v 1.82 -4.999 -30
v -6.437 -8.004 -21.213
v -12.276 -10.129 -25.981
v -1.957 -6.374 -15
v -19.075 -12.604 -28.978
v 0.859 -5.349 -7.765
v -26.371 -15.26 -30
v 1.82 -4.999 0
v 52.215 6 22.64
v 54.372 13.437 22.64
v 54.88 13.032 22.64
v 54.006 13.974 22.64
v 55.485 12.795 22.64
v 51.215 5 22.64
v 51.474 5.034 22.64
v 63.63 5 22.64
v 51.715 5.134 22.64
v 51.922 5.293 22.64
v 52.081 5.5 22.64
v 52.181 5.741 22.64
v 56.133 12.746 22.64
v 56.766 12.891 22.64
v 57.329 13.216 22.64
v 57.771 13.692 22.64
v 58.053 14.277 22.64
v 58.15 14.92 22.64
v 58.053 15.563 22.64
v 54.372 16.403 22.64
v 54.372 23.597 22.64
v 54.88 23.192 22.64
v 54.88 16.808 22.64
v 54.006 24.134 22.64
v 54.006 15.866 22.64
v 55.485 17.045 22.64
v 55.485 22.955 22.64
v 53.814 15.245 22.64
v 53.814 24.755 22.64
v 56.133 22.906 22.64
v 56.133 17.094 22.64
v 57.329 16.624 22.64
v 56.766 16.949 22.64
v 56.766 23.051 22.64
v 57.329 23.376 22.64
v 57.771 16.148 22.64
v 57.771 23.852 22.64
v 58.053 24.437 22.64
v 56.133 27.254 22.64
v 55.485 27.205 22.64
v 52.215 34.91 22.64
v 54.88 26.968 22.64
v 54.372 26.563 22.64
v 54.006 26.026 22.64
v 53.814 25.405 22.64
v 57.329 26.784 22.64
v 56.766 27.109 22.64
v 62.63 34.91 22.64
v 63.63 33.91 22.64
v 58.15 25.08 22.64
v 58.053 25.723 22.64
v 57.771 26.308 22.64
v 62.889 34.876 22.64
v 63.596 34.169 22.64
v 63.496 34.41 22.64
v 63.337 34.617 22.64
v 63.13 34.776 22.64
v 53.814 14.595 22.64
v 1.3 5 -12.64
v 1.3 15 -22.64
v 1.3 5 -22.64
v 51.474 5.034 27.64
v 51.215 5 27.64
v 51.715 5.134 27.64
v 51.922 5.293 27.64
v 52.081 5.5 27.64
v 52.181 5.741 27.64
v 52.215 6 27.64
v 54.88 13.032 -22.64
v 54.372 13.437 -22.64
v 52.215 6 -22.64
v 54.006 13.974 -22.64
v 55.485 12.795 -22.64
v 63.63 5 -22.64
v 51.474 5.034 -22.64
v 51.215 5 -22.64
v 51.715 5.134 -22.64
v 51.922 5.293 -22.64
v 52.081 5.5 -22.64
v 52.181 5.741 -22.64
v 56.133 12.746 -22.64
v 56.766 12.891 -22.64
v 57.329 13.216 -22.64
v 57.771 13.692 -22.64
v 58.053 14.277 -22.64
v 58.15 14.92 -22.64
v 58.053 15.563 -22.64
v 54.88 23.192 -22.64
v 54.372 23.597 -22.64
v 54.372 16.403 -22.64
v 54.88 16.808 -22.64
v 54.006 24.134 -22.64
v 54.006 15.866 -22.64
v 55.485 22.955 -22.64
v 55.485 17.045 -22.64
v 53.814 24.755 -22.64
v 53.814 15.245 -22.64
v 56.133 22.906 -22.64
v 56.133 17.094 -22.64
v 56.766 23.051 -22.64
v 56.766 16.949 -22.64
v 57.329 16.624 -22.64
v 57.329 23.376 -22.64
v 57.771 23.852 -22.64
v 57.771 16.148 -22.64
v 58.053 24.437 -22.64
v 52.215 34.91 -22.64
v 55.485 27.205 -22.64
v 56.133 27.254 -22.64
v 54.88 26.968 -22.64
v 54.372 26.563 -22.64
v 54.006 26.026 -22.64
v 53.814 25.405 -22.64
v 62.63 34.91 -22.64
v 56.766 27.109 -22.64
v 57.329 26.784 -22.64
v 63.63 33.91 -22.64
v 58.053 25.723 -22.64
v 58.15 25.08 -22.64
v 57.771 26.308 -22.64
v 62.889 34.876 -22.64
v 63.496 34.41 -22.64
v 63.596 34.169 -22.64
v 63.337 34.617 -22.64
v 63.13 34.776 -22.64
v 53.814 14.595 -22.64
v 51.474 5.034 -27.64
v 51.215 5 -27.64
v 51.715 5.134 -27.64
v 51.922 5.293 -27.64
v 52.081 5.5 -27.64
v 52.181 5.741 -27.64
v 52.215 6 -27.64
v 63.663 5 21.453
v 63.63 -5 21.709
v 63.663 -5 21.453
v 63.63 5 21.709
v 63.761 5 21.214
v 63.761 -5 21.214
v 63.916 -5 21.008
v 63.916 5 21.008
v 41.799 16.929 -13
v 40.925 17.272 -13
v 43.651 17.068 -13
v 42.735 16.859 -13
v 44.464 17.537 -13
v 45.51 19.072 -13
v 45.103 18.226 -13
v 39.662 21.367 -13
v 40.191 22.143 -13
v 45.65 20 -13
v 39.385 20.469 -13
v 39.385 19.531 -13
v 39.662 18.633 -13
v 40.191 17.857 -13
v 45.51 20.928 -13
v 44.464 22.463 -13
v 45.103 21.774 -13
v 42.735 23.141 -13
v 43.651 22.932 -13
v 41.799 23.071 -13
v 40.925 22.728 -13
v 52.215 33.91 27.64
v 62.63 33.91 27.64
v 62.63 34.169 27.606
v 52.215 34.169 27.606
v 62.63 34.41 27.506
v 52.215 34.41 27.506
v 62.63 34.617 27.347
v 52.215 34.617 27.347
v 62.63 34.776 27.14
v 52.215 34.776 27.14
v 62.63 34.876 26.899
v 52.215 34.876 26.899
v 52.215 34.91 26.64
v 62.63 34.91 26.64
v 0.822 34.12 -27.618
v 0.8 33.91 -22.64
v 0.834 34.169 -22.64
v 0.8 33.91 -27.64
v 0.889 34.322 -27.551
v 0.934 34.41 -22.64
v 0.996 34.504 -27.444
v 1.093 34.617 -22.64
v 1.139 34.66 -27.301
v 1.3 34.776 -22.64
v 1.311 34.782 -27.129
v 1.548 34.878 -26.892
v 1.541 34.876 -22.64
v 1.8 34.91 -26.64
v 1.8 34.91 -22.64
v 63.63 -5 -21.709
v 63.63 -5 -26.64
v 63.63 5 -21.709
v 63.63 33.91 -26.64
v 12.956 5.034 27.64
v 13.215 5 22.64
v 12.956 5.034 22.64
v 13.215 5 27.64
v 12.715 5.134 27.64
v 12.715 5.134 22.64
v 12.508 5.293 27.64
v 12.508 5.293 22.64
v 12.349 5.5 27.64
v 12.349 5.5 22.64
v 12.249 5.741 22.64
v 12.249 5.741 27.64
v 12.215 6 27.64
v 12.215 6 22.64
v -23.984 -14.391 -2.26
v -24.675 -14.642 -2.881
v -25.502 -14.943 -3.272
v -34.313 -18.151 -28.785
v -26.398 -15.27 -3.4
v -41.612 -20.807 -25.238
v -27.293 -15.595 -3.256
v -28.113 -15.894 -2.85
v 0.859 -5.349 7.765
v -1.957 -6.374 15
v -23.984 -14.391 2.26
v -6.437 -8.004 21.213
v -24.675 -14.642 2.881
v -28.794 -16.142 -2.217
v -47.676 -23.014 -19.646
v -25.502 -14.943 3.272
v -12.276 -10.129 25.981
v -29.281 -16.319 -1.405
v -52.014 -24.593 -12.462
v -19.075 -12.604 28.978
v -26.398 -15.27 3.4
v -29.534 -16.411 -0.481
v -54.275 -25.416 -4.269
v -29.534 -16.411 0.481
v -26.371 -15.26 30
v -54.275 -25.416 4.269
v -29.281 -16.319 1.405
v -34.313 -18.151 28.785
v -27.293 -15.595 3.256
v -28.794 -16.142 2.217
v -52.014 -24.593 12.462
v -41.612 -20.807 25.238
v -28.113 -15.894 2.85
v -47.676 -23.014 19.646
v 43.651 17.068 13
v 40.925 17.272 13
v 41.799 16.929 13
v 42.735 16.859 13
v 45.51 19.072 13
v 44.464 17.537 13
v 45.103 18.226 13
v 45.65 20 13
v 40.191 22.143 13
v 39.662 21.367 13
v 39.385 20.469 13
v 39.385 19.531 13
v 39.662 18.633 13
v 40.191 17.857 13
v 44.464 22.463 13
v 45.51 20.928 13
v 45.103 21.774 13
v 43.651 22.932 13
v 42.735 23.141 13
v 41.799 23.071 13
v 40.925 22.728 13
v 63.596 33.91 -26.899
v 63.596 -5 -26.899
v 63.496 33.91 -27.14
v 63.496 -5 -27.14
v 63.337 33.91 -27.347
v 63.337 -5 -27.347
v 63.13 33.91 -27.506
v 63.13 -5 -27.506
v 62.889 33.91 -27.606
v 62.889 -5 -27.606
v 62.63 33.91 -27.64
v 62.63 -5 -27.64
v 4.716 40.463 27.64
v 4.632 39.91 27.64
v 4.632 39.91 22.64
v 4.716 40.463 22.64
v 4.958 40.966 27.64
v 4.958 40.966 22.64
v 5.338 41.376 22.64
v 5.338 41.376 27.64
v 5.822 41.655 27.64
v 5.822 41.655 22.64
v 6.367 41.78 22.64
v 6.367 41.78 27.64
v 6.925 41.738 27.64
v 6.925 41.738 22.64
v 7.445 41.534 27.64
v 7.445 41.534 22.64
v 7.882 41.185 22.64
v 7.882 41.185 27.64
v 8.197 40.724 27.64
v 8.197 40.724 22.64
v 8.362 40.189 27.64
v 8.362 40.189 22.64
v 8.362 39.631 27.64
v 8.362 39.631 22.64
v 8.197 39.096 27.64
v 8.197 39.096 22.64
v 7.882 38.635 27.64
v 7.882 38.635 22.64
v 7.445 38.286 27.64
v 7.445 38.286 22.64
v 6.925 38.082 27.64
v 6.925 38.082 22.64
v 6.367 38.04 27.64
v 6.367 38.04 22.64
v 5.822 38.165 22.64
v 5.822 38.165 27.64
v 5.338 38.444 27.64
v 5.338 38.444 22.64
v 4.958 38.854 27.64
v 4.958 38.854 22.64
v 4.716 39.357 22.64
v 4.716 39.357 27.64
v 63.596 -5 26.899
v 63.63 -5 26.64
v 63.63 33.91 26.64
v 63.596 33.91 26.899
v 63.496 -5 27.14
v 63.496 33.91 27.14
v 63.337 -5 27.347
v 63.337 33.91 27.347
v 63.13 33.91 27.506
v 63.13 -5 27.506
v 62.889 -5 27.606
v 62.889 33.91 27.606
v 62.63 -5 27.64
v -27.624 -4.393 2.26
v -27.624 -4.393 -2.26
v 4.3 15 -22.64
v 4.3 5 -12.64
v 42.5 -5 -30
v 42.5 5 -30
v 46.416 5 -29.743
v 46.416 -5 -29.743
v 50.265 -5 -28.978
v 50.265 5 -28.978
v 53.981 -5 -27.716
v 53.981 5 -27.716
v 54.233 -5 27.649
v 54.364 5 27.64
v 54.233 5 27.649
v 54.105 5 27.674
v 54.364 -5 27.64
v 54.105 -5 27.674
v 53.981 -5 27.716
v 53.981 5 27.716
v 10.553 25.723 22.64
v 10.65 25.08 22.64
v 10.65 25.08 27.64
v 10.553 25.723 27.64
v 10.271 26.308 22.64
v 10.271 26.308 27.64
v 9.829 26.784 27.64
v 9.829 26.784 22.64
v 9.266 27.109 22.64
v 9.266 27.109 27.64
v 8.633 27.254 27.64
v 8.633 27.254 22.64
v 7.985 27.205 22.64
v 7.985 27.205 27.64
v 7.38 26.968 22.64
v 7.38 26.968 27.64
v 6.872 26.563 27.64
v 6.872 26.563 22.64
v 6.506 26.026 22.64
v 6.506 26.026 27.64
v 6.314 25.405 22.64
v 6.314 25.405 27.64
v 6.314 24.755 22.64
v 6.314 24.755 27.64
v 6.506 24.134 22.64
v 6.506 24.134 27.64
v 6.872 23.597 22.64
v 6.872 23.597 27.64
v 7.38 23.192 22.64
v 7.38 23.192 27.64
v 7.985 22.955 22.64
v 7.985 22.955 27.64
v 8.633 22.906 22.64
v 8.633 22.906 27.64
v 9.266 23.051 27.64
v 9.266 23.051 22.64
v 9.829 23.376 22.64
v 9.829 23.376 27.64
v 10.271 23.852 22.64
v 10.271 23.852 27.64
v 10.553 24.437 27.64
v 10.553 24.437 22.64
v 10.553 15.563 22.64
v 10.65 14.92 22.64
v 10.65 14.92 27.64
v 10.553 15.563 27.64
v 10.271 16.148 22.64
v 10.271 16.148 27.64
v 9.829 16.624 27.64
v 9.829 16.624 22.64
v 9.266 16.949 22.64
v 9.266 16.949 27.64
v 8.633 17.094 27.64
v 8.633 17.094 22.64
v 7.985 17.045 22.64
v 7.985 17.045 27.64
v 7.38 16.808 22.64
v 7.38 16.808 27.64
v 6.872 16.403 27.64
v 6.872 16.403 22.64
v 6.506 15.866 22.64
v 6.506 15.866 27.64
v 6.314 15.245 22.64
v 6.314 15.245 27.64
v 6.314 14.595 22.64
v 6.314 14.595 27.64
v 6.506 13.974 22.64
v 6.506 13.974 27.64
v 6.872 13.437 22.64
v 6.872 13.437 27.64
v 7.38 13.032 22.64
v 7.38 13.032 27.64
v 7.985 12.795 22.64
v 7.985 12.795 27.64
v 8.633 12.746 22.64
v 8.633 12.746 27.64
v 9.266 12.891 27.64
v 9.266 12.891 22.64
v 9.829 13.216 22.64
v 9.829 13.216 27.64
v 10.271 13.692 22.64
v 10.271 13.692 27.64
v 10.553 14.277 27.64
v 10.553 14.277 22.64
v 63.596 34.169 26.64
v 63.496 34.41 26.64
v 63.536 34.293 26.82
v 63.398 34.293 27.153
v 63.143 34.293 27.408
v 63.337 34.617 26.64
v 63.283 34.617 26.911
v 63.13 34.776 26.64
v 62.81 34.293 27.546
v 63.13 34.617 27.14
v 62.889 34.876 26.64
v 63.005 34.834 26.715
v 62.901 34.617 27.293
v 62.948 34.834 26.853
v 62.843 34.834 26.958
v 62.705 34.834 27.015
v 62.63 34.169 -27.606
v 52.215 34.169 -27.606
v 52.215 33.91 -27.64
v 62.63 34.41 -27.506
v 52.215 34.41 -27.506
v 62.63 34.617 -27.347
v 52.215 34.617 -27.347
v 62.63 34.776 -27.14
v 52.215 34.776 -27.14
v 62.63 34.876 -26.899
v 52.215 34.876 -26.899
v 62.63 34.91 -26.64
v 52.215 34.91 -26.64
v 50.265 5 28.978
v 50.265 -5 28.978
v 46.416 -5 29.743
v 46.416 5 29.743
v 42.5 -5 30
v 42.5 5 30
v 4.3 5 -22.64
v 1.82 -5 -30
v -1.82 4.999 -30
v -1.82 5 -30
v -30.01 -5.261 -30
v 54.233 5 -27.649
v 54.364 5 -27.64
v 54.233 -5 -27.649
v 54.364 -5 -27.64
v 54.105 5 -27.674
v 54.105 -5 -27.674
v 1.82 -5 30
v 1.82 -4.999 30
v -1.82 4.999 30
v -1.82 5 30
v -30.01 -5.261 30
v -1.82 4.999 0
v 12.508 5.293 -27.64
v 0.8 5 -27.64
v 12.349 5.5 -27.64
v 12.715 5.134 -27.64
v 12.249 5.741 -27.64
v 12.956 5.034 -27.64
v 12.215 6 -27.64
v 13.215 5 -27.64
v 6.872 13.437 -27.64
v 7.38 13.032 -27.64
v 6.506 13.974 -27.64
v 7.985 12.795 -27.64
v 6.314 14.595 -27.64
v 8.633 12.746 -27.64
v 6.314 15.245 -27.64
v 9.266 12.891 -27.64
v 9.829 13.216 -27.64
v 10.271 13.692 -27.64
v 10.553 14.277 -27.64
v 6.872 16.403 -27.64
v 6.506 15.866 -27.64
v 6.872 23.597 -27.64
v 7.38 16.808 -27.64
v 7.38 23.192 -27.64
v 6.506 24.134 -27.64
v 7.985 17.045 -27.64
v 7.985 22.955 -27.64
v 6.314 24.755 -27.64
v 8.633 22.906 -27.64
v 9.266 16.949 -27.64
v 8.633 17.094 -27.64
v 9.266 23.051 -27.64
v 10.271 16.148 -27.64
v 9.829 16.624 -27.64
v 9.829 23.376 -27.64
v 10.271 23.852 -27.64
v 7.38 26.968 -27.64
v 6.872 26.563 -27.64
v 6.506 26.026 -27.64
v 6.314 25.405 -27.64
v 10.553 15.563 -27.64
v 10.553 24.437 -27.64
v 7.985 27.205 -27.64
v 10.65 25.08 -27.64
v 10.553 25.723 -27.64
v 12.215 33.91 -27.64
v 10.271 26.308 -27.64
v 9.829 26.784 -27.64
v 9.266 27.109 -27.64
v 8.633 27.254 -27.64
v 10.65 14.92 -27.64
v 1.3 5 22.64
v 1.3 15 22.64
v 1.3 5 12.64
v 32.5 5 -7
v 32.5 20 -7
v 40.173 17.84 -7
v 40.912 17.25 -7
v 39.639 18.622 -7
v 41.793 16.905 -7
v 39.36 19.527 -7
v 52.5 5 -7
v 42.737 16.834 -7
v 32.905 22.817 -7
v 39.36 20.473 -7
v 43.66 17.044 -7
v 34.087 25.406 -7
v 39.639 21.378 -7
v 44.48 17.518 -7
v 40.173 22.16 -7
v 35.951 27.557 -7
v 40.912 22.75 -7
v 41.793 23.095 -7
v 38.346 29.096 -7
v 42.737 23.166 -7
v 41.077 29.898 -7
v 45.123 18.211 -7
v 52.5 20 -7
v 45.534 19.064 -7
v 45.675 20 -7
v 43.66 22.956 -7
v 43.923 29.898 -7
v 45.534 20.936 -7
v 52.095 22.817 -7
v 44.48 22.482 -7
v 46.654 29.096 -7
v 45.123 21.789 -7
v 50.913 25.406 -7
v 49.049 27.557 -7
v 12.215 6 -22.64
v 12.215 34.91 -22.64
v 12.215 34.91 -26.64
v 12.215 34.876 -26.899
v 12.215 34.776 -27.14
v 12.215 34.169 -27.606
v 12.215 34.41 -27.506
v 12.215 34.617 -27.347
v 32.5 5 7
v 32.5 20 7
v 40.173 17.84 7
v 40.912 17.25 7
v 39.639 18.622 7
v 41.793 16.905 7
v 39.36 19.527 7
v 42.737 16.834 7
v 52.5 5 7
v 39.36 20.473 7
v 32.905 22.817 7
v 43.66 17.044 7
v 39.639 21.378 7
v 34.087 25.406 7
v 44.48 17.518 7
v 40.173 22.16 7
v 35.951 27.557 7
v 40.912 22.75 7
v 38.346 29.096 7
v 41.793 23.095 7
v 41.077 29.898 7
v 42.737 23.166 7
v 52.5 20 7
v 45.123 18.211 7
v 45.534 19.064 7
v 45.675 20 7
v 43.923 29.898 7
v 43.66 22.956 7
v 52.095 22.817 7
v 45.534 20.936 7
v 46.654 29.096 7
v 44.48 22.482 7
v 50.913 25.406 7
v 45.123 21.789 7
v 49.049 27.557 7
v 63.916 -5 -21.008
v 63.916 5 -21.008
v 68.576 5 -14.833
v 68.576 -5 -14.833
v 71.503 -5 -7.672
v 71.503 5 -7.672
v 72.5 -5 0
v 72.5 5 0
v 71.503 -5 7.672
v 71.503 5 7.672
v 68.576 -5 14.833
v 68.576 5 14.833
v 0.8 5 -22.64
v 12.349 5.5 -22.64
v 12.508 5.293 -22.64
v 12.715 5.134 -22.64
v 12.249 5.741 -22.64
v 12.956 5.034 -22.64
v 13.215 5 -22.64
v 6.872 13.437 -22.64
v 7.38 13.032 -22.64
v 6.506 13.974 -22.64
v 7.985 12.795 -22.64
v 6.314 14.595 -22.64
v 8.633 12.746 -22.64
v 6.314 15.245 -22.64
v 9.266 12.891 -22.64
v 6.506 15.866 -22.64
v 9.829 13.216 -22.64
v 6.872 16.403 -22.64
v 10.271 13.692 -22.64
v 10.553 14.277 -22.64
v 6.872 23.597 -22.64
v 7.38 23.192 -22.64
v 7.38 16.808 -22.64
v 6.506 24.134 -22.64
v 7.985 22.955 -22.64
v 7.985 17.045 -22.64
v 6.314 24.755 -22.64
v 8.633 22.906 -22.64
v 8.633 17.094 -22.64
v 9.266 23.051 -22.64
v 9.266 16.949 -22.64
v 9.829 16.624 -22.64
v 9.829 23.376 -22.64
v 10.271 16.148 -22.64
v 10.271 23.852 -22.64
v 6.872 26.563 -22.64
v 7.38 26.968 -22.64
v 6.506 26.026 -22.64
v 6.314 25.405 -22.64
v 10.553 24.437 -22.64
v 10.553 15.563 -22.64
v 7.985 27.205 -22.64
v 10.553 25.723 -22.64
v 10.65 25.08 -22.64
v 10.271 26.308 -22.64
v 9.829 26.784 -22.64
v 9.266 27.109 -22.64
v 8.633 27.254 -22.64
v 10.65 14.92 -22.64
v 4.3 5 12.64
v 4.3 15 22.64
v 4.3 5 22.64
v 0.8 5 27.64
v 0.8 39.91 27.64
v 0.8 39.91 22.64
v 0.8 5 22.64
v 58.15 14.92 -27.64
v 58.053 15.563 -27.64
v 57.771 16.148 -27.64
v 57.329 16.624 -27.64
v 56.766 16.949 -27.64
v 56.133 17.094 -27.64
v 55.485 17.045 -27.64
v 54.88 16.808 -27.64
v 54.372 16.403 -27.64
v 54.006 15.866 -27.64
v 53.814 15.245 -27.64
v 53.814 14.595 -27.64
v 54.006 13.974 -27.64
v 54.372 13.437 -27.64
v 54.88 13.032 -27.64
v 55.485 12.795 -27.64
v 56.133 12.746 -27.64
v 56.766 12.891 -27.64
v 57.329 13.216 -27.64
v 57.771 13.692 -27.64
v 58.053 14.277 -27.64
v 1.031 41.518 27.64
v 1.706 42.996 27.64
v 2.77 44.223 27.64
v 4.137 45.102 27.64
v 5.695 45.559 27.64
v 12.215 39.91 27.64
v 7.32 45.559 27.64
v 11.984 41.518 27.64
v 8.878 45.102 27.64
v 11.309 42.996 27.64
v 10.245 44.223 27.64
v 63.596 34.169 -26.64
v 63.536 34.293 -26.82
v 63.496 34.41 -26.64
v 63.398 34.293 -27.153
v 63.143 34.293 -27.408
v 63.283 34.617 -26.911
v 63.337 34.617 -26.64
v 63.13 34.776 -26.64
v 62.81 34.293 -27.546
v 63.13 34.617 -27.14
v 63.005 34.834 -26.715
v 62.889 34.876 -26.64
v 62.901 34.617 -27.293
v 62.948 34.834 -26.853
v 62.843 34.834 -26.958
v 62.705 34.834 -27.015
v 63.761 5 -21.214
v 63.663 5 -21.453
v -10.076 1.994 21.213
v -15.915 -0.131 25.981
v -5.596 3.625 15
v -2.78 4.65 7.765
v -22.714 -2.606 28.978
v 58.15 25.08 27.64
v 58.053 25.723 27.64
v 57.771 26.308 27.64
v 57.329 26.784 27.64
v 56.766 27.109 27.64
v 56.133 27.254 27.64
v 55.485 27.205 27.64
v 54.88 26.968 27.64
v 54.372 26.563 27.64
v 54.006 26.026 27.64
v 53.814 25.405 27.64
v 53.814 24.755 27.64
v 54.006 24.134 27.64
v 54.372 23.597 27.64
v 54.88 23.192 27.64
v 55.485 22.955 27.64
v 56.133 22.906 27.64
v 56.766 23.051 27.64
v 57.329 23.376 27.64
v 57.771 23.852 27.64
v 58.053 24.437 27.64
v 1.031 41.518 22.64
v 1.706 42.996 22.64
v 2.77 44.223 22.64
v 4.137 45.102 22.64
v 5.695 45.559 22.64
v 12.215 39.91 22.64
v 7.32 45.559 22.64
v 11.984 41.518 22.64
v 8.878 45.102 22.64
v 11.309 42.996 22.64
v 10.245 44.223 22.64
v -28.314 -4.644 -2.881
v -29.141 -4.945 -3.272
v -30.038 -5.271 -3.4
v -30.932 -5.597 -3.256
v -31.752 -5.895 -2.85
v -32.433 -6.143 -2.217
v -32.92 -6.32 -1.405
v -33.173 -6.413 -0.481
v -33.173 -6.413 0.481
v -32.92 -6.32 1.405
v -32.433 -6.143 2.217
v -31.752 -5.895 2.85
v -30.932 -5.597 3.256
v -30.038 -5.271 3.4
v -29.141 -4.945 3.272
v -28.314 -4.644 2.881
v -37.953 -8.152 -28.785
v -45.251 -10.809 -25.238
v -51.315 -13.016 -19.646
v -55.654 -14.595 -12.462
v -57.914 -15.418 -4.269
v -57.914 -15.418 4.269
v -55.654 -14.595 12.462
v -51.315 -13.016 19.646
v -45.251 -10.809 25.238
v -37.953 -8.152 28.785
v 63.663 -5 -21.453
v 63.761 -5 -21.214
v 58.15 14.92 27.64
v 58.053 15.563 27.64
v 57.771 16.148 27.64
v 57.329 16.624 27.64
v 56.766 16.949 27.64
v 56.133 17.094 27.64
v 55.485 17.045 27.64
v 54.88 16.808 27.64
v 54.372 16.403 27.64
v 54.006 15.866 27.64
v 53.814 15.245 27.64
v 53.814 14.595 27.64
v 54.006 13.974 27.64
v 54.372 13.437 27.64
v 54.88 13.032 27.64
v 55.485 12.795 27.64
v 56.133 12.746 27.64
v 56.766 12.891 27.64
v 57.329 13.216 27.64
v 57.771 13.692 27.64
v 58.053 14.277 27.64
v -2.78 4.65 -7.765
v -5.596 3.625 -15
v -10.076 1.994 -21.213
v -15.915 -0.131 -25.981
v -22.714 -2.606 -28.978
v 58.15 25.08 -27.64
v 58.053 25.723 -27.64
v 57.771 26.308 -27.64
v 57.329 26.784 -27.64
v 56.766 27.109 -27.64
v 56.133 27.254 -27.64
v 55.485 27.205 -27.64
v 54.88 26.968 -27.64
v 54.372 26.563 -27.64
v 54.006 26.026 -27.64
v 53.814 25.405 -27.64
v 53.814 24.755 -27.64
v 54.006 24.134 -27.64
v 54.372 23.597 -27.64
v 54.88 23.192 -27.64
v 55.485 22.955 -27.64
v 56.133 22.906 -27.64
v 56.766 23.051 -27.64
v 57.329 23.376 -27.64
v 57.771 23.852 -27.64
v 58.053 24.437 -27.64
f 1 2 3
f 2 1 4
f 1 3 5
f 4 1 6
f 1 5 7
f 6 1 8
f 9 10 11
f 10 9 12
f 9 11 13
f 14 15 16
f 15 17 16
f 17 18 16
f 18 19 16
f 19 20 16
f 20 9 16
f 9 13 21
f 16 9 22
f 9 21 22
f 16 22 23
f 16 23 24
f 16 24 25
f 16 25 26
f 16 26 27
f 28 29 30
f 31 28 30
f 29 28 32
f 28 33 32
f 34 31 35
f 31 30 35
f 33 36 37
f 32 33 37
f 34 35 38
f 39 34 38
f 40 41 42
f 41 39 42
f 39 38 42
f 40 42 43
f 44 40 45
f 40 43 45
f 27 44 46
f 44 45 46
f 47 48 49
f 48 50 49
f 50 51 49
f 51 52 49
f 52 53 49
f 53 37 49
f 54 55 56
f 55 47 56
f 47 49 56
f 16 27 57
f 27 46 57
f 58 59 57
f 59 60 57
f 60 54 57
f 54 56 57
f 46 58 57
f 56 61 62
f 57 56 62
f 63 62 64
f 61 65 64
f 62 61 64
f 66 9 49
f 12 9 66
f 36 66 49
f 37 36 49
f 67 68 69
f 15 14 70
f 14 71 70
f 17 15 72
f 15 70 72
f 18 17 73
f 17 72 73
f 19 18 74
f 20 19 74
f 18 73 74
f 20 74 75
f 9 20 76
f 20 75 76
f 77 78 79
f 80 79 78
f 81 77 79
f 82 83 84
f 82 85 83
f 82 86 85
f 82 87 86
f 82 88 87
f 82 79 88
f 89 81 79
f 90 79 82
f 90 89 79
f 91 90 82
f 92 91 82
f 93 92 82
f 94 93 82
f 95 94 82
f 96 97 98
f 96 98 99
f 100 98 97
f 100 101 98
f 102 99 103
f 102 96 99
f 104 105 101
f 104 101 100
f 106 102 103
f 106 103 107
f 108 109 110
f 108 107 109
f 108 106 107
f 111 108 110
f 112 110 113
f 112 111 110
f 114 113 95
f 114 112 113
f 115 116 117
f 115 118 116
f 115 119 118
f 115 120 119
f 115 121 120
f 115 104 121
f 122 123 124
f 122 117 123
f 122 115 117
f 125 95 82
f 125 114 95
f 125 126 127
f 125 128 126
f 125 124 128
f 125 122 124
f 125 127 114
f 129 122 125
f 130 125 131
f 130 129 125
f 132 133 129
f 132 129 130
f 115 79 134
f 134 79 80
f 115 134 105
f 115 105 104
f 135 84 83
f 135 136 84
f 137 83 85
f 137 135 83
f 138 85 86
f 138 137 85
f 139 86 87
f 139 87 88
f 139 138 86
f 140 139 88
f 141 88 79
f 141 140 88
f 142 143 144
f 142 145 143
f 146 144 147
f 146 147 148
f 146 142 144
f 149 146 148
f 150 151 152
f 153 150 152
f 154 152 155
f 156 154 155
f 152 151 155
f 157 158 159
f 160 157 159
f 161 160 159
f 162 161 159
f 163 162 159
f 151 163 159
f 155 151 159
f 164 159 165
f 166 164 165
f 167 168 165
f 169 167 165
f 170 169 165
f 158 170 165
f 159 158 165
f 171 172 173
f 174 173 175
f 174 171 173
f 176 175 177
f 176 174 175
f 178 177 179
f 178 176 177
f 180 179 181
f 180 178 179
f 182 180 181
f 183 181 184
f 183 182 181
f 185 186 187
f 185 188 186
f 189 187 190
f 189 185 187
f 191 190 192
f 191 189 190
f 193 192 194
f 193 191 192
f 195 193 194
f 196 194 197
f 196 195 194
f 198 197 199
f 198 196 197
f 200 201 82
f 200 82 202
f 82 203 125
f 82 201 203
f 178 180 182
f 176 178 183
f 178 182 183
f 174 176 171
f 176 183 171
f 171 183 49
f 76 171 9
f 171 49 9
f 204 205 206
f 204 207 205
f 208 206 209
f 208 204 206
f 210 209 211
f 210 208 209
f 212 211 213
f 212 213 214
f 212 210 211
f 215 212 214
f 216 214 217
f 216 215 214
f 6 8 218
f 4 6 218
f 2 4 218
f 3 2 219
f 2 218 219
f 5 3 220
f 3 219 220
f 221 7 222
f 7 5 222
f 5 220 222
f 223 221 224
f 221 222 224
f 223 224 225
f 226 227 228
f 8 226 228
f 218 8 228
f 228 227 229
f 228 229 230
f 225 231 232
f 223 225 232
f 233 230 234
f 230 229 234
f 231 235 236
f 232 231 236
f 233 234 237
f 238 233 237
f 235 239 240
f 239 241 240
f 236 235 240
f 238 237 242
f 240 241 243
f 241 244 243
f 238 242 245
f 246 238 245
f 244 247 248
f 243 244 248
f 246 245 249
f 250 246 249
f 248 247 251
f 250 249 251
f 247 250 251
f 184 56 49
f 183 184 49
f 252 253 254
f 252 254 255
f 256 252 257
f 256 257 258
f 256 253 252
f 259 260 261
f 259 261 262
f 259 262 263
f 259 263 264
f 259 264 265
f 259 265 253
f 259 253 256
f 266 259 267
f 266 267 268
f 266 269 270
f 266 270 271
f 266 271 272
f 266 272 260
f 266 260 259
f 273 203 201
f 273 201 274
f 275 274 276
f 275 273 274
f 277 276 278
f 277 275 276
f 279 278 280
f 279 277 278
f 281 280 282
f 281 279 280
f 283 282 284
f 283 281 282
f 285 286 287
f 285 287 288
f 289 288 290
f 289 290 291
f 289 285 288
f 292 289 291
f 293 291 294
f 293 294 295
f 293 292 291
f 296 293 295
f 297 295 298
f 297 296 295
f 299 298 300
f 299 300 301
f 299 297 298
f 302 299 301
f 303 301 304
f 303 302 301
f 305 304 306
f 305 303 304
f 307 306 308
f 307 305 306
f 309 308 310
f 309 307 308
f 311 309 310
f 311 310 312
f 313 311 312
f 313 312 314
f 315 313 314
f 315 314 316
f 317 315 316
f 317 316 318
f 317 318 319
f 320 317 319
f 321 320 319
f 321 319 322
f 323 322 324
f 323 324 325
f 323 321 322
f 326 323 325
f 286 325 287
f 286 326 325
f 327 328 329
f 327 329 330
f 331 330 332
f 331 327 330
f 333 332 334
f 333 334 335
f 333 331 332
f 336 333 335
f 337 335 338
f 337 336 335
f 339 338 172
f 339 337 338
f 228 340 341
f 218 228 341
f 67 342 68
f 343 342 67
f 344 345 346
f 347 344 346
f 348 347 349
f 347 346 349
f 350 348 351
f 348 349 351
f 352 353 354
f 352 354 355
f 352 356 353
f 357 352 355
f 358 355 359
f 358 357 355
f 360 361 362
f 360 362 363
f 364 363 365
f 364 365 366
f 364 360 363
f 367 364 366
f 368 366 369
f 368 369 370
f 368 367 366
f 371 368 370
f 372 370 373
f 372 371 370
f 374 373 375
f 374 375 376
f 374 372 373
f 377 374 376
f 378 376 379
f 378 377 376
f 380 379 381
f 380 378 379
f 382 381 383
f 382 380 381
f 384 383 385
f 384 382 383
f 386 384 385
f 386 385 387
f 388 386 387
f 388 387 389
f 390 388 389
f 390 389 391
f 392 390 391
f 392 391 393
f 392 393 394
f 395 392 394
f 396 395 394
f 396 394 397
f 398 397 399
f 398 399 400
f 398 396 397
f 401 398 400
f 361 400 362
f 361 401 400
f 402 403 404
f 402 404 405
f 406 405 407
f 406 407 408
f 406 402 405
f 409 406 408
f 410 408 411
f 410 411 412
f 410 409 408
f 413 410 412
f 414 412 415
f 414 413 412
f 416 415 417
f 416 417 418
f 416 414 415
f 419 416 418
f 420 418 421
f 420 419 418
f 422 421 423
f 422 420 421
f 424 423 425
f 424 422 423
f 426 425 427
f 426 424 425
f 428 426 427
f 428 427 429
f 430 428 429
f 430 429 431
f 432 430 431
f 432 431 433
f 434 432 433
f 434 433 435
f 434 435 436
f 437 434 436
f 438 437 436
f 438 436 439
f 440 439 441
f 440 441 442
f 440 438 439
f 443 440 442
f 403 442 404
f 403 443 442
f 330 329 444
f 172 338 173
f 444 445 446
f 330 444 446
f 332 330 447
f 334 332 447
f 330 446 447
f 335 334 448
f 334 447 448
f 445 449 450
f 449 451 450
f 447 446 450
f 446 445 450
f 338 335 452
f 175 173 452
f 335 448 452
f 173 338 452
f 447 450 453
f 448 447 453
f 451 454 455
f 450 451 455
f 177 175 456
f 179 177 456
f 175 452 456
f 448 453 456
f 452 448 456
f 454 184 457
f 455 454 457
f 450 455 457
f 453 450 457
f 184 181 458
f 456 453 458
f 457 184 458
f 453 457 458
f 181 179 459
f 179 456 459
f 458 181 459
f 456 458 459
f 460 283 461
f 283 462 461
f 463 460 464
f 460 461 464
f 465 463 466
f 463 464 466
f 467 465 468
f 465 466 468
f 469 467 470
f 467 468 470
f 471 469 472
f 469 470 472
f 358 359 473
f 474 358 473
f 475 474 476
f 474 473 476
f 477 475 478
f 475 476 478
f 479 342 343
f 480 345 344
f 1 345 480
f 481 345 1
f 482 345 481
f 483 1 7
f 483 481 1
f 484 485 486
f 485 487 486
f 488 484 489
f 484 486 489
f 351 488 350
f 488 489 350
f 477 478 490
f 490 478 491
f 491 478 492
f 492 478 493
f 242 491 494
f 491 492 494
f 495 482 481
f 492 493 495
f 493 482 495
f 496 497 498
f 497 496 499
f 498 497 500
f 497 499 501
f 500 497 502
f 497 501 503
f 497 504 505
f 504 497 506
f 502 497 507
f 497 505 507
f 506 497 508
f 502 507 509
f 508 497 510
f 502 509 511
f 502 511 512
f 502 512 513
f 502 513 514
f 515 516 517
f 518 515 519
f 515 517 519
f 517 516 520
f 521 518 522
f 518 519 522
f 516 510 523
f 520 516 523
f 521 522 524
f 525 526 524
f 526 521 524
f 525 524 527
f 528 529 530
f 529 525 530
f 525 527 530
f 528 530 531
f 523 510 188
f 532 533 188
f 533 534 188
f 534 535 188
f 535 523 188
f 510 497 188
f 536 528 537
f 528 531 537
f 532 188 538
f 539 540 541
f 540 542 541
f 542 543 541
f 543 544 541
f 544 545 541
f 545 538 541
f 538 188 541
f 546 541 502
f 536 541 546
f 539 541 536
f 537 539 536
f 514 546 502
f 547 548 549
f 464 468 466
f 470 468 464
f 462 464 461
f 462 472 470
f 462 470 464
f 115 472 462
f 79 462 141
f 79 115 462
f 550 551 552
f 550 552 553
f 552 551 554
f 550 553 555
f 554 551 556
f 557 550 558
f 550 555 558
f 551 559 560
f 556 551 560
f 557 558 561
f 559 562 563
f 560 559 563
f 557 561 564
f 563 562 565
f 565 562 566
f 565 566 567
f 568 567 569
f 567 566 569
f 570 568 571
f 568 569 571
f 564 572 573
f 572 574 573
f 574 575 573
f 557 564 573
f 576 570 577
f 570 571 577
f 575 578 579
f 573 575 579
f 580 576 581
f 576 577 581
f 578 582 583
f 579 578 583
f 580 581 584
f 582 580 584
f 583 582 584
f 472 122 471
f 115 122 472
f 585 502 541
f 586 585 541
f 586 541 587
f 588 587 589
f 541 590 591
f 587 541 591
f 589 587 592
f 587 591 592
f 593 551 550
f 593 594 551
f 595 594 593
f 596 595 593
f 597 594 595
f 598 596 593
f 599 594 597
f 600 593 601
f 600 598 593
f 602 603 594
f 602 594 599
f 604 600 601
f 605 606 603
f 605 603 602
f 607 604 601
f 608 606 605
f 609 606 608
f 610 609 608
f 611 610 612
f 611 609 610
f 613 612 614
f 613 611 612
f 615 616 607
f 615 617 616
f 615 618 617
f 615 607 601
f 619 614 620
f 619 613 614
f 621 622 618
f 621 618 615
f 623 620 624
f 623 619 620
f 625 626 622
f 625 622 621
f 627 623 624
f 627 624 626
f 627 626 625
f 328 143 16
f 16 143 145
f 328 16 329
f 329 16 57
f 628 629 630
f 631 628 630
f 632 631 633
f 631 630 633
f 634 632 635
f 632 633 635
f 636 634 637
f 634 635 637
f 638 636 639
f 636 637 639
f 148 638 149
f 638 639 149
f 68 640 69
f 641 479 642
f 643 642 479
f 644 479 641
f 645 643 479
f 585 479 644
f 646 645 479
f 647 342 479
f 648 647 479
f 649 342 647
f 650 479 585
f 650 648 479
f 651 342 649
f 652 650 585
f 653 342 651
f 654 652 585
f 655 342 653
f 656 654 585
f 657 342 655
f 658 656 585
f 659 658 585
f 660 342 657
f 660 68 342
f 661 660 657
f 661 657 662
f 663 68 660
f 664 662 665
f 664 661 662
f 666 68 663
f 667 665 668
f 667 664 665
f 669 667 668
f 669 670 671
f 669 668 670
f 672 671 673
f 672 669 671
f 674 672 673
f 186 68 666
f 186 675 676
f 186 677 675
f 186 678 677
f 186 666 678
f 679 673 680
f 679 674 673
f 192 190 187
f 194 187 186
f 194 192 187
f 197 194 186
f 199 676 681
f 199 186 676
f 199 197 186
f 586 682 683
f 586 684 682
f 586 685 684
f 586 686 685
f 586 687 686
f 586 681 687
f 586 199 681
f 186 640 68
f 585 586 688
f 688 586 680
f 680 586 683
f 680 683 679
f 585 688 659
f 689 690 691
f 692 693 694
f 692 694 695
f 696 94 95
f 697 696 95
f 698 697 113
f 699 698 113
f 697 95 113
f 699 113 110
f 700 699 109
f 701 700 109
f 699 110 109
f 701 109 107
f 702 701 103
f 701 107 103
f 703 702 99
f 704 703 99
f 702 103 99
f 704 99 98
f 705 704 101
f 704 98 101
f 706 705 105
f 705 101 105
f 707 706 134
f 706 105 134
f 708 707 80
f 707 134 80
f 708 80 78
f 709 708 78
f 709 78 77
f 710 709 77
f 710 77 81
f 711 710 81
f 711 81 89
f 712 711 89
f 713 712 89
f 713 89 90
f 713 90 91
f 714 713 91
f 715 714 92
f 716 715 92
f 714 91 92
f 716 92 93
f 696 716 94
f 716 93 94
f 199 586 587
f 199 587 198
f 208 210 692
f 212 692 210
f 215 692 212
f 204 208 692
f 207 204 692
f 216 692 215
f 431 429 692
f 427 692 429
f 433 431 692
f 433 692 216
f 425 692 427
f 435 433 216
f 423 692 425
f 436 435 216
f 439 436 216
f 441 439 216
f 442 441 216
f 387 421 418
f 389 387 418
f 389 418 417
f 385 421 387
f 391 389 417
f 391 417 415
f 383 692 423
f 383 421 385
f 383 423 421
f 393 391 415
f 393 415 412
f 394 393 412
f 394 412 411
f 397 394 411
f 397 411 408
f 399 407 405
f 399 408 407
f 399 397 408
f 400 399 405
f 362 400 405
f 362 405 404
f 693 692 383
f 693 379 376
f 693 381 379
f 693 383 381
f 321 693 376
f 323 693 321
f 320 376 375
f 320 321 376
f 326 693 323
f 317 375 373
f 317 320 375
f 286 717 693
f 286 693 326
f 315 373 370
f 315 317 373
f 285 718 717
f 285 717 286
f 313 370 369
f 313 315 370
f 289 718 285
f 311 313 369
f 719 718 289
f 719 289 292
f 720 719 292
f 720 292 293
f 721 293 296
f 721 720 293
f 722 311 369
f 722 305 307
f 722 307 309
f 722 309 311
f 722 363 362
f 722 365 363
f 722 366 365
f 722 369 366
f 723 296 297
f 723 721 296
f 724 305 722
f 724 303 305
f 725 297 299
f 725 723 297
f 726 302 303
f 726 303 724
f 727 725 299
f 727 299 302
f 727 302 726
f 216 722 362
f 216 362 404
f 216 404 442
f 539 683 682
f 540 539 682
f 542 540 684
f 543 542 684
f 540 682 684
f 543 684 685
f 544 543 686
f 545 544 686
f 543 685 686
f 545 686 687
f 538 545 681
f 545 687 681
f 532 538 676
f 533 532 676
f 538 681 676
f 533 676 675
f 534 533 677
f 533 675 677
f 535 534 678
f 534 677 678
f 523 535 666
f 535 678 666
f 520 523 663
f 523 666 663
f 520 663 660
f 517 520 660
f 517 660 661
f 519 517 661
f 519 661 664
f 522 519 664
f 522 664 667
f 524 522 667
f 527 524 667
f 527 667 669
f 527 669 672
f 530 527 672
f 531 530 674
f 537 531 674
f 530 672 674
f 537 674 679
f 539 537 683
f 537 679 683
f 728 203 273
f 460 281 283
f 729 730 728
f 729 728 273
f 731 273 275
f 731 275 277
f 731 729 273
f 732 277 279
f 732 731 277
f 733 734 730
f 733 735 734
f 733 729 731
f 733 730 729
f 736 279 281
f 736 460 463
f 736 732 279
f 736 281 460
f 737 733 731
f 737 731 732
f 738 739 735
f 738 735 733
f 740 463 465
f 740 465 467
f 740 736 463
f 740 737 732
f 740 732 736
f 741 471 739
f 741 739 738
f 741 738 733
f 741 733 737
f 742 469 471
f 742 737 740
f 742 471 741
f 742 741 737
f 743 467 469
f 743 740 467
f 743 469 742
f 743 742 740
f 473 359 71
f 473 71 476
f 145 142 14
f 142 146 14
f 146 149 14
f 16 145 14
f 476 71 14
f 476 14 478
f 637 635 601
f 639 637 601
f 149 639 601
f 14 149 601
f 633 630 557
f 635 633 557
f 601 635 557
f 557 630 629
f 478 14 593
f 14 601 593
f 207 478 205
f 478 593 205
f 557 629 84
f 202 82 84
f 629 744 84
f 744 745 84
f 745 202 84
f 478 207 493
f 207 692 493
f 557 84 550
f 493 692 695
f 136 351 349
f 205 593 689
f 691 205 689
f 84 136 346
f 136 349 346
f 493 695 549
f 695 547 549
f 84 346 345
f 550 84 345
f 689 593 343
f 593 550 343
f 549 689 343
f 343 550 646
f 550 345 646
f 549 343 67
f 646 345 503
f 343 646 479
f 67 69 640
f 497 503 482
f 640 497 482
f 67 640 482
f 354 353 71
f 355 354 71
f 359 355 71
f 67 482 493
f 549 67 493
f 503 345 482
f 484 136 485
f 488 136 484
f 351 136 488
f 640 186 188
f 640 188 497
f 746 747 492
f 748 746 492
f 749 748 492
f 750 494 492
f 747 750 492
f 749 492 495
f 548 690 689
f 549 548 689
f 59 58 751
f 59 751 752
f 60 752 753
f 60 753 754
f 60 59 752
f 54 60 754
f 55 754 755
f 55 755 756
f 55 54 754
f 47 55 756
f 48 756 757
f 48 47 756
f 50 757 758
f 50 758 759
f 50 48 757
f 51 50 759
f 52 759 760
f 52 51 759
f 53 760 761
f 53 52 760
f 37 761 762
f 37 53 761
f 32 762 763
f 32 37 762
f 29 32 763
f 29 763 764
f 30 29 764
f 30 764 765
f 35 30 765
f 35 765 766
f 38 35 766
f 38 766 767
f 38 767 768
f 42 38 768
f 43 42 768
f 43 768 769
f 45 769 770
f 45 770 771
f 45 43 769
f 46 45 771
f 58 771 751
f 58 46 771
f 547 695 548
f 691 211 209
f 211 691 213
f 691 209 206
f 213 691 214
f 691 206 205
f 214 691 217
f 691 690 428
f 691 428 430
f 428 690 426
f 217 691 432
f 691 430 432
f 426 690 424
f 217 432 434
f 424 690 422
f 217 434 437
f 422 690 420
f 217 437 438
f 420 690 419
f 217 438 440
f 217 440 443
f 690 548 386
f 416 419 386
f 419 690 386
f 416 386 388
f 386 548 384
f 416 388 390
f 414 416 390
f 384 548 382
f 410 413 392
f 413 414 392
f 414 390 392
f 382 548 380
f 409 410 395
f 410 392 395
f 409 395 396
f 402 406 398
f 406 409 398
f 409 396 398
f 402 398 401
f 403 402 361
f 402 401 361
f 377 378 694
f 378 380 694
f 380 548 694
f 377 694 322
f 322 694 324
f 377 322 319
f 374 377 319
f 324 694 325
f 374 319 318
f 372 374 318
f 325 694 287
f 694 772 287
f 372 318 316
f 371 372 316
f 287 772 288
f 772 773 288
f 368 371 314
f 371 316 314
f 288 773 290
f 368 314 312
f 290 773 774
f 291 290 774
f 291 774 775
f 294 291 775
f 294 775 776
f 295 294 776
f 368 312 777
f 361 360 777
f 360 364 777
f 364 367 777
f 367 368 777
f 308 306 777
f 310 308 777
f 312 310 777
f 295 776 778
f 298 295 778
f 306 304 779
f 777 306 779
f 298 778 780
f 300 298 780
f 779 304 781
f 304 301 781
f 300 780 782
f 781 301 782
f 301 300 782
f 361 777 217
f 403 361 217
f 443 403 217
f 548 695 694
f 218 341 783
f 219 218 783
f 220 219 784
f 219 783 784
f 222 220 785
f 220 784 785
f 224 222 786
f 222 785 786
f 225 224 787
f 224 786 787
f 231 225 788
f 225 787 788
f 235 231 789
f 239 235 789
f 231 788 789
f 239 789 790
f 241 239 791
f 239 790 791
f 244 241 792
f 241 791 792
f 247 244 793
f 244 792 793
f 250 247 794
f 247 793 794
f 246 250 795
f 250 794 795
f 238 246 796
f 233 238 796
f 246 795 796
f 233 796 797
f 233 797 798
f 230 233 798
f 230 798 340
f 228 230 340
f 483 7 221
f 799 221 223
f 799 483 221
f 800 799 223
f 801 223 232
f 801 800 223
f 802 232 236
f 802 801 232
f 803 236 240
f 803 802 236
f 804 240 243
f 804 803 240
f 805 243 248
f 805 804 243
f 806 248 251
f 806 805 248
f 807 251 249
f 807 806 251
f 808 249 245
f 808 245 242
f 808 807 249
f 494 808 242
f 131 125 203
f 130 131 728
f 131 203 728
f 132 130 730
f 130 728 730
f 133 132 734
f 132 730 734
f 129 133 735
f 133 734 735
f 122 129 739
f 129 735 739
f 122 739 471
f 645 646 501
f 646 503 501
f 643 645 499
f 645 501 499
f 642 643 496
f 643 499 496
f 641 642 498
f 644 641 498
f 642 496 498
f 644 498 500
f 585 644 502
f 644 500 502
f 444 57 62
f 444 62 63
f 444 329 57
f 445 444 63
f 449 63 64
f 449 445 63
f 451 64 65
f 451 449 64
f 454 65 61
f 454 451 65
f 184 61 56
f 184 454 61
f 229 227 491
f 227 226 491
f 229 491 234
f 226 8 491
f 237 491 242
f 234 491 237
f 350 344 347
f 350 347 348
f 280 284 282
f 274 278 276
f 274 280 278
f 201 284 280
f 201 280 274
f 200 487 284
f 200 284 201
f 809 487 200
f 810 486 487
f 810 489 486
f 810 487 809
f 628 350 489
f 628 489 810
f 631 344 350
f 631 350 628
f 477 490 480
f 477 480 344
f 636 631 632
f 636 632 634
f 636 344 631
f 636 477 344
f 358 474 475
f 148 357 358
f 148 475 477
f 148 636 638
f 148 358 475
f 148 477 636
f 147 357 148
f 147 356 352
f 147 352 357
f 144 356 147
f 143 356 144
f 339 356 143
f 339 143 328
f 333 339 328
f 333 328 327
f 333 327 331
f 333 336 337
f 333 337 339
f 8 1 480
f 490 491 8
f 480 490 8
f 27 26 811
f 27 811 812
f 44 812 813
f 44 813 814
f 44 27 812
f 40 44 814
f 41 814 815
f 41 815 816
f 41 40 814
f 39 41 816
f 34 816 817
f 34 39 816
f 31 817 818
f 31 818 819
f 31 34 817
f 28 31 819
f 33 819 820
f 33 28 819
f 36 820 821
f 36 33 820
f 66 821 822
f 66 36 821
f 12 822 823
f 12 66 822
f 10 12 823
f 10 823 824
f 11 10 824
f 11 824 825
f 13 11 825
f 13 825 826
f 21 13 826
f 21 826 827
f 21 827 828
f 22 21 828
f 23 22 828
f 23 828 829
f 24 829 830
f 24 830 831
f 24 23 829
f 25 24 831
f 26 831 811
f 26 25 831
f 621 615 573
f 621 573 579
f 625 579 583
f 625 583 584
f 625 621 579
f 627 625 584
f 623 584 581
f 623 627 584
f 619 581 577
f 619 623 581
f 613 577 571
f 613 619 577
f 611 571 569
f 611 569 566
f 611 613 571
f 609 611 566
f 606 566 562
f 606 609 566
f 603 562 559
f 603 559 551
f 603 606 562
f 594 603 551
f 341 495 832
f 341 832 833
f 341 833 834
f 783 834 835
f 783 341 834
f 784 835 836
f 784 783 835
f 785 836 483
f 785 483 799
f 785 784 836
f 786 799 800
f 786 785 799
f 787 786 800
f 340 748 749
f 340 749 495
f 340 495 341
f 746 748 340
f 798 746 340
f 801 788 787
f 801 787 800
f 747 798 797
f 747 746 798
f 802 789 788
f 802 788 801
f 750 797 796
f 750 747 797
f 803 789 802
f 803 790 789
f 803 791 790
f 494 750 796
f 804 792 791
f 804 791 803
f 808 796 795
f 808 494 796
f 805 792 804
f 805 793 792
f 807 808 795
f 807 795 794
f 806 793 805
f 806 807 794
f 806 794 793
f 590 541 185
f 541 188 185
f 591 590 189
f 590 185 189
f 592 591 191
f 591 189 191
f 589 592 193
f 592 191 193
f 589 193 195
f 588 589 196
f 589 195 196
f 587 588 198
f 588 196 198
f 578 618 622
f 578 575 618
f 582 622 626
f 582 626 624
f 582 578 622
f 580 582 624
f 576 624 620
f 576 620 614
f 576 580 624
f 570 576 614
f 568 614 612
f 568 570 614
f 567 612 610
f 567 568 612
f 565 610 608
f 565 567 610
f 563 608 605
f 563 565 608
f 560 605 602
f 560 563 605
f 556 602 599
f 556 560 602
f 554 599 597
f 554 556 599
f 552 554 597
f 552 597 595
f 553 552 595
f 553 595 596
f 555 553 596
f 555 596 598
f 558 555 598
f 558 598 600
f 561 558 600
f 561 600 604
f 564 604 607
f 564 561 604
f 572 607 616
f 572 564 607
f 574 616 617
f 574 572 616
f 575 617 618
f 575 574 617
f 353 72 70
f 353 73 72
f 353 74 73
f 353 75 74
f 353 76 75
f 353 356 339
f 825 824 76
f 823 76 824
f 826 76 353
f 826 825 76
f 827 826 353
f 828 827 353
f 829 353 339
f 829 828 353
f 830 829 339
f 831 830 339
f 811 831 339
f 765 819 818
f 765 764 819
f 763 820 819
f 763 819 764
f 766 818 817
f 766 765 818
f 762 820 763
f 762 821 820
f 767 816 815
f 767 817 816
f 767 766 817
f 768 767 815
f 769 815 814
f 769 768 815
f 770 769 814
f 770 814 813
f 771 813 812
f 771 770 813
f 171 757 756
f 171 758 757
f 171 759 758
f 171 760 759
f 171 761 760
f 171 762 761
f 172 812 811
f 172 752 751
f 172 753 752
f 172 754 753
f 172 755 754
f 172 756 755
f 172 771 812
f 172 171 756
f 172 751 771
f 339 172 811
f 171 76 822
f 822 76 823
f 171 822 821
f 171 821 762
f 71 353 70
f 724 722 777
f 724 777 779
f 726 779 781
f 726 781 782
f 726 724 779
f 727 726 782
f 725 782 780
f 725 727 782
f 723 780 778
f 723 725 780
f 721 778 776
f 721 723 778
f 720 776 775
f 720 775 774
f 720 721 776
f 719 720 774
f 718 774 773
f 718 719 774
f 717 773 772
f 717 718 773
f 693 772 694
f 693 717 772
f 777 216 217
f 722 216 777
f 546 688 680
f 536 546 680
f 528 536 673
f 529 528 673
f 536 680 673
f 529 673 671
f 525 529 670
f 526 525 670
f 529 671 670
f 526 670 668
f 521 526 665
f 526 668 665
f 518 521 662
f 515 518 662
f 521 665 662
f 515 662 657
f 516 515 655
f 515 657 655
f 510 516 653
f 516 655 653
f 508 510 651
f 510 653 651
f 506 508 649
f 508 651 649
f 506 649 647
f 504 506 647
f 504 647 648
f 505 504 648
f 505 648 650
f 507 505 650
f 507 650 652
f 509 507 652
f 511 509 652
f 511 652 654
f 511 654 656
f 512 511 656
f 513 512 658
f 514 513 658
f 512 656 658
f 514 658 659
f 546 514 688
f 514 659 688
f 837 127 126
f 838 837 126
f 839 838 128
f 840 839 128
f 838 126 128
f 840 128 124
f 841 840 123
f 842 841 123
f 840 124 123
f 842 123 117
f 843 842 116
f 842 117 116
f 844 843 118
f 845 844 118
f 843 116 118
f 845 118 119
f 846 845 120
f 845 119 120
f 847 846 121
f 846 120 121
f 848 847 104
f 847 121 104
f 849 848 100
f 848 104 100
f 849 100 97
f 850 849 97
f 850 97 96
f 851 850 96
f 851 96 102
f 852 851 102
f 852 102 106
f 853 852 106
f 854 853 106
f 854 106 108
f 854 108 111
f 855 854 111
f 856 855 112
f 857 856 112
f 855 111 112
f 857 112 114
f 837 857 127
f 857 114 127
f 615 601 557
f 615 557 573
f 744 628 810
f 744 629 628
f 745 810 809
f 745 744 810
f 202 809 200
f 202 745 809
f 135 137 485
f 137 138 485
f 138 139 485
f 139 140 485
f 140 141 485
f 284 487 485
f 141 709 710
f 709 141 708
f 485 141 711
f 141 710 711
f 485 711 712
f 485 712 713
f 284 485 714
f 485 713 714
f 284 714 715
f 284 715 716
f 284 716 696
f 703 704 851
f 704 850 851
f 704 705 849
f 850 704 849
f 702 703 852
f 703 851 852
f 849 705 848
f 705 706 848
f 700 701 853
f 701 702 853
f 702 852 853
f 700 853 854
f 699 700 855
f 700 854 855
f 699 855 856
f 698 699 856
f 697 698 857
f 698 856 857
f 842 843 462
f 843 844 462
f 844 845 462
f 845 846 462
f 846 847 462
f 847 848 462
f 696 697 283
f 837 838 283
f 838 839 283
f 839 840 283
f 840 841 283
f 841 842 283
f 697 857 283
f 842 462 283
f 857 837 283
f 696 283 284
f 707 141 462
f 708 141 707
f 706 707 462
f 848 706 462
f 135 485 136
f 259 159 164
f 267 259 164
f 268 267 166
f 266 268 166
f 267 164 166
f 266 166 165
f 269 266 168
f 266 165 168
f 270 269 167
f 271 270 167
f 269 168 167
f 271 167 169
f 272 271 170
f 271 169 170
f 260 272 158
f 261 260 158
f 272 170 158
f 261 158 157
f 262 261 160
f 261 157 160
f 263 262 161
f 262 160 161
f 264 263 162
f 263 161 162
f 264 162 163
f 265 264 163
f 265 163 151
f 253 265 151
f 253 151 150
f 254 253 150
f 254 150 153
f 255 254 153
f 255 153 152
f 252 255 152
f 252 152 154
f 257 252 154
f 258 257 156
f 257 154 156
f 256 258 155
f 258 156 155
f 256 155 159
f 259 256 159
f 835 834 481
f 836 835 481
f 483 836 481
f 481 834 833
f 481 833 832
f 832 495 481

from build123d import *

# Parameters (mm, degrees)
BOSS_EXTRU_3_DEPTH       = 5
ESQUISSE7_R              = 3.175
BOSS_EXTRU_5_DEPTH       = 7
ESQUISSE13_R             = 2.18
BOSS_EXTRU_8_DEPTH       = 5
ENL_V_MAT_EXTRU_8_REACH  = 100.981
ESQUISSE47_W             = 40
ESQUISSE47_H             = 5
ESQUISSE33_W             = 9.466792894
ESQUISSE33_H             = 55.28
BOSS_EXTRU_10_DEPTH      = 10
ENL_V_MAT_EXTRU_6_DEPTH  = 65
ESQUISSE35_R             = 30
BOSS_EXTRU_11_DEPTH      = 5.32
BOSS_EXTRU_12_DEPTH      = 30
ENL_V_MAT_EXTRU_7_DEPTH  = 60
BOSS_EXTRU_13_DEPTH      = 5
NERVURE4_REACH           = 90.538
ESQUISSE45_WALL_W        = 193.218913386
ESQUISSE45_WALL_H        = 3
CONG_1_R                 = 1
CONG_2_R                 = 1
BOSS_EXTRU_14_DEPTH      = 13
BOSS_EXTRU_14_DEPTH_BACK = 13
ESQUISSE48_R             = 3.15


with BuildPart() as part:
    # Esquisse5 → Boss.-Extru.3 (new, symmetric)
    with BuildSketch(Plane(origin=(0, 0, 0), x_dir=(1, 0, 0), z_dir=(0, 1, 0))):
        with BuildLine():
            Line((42.5, -30), (-42.5, -30))
            ThreePointArc((-42.5, -30), (-72.5, 0), (-42.5, 30))
            Line((-42.5, 30), (42.5, 30))
            ThreePointArc((42.5, 30), (72.5, 0), (42.5, -30))
        make_face()
    extrude(amount=BOSS_EXTRU_3_DEPTH, both=True)

    # Esquisse7 → Boss.-Extru.5 (add, symmetric)
    with BuildSketch(Plane.XY):
        with BuildLine():
            Line((32.5, 5), (52.5, 5))
            Line((52.5, 5), (52.5, 20))
            ThreePointArc((52.5, 20), (42.5, 30), (32.5, 20))
            Line((32.5, 20), (32.5, 5))
        make_face()
        with Locations((42.5, 20)):
            Circle(ESQUISSE7_R, mode=Mode.SUBTRACT)
    extrude(amount=BOSS_EXTRU_5_DEPTH, both=True)

    # Esquisse13 → Boss.-Extru.8 (add)
    with BuildSketch(Plane.XY.offset(22.64)):
        Polygon((0.8, 5), (5.8, 5), (12.215, 5), (12.215, 29.91), (52.215, 29.91), (52.215, 5), (58.63, 5), (63.63, 5), (63.63, 34.91), (0.8, 34.91), align=None)
        with Locations((8.47, 14.92)):
            Circle(ESQUISSE13_R, mode=Mode.SUBTRACT)
        with Locations((55.97, 14.92)):
            Circle(ESQUISSE13_R, mode=Mode.SUBTRACT)
        with Locations((8.47, 25.08)):
            Circle(ESQUISSE13_R, mode=Mode.SUBTRACT)
        with Locations((55.97, 25.08)):
            Circle(ESQUISSE13_R, mode=Mode.SUBTRACT)
    boss_extru_8 = extrude(amount=BOSS_EXTRU_8_DEPTH)

    # Esquisse47 → Enlèv. mat.-Extru.8 (cut, up to next)
    with BuildSketch(Plane.XY.offset(27.64), mode=Mode.PRIVATE) as enl_v_mat_extru_8_sk1:
        with Locations((32.215, 32.41)):
            Rectangle(ESQUISSE47_W, ESQUISSE47_H)
    enl_v_mat_extru_8_tool1 = extrude(enl_v_mat_extru_8_sk1.sketch, amount=-ENL_V_MAT_EXTRU_8_REACH, mode=Mode.PRIVATE) & part.part
    enl_v_mat_extru_8 = enl_v_mat_extru_8_tool1.solids().sort_by_distance((32.215, 32.41, 27.64))[0]
    add(enl_v_mat_extru_8, mode=Mode.SUBTRACT)

    # Symétrie2: Boss.-Extru.8, Enlèv. mat.-Extru.8 across plane
    add(boss_extru_8.mirror(Plane.XY))
    add(enl_v_mat_extru_8.mirror(Plane.XY), mode=Mode.SUBTRACT)

    # Esquisse33 → Boss.-Extru.10 (add)
    with BuildSketch(Plane.XZ.offset(-5)):
        with Locations((58.896603553, 0)):
            Rectangle(ESQUISSE33_W, ESQUISSE33_H)
    extrude(amount=BOSS_EXTRU_10_DEPTH)

    # Esquisse36 → Enlèv. mat.-Extru.6 (cut, symmetric)
    with BuildSketch(Plane.XY):
        Polygon((0, 0), (9.099255857, -25), (-112.5, -25), (-112.5, 35), (-12.738958199, 35), align=None)
    extrude(amount=ENL_V_MAT_EXTRU_6_DEPTH, both=True, mode=Mode.SUBTRACT)



with BuildPart() as body_2:
    # Esquisse35 → Boss.-Extru.11 (new, symmetric)
    with BuildSketch(Plane(origin=(0, 0, 0), x_dir=(0, 0, -1), z_dir=(-0.34202014332566977, 0.939692620785908, 0))):
        with Locations(Location((0, 30, 0), (0, 0, 90))):
            Circle(ESQUISSE35_R)
    extrude(amount=BOSS_EXTRU_11_DEPTH, both=True)


with BuildPart() as part_1:
    add(part.part)

    add(body_2.part)  # Boss.-Extru.12 merges body 2
    # Esquisse40 → Boss.-Extru.12 (add, symmetric)
    with BuildSketch(Plane.XY):
        Polygon((-26.371231461, -15.259769042), (-30.010325786, -5.261439557), (-1.819547162, 4.999164743), (1.819547162, -4.999164743), align=None)
    extrude(amount=BOSS_EXTRU_12_DEPTH, both=True)

    # Esquisse41 → Enlèv. mat.-Extru.7 (cut)
    with BuildSketch(Plane(origin=(-1.819547162, 4.999164743, 0), x_dir=(0.939692620785908, 0.3420201433256698, 0), z_dir=(-0.3420201433256698, 0.9396926207859081, 0))):
        with BuildLine():
            Line((-27.46, -2.260176984), (-27.46, 2.260176984))
            ThreePointArc((-27.46, 2.260176984), (-33.4, 0), (-27.46, -2.260176984))
        make_face()
    extrude(amount=-ENL_V_MAT_EXTRU_7_DEPTH, mode=Mode.SUBTRACT)

    # Esquisse42 → Boss.-Extru.13 (add)
    with BuildSketch(Plane.XY.offset(27.64)):
        with BuildLine():
            Line((0.8, 39.91), (0.8, 34.91))
            Line((0.8, 34.91), (12.215, 34.91))
            Line((12.215, 34.91), (12.215, 39.91))
            Line((12.215, 39.91), (8.3825, 39.91))
            ThreePointArc((8.3825, 39.91), (6.5075, 38.035), (4.6325, 39.91))
            Line((4.6325, 39.91), (0.8, 39.91))
        make_face()
        with BuildLine():
            ThreePointArc((12.215, 39.91), (6.5075, 45.6175), (0.8, 39.91))
            Line((0.8, 39.91), (4.6325, 39.91))
            ThreePointArc((4.6325, 39.91), (6.5075, 41.785), (8.3825, 39.91))
            Line((8.3825, 39.91), (12.215, 39.91))
        make_face()
    extrude(amount=-BOSS_EXTRU_13_DEPTH)

    # Esquisse45 wall → Nervure4 (add, up to next)
    with BuildSketch(Plane(origin=(2.8, 9.999582371, 17.640000004), x_dir=(0, -0.707106781505, -0.707106780868), z_dir=(0, -0.707106780868, 0.707106781505)), mode=Mode.PRIVATE) as nervure4_sk1:
        Rectangle(ESQUISSE45_WALL_W, ESQUISSE45_WALL_H)
    nervure4_tool1 = extrude(nervure4_sk1.sketch, amount=NERVURE4_REACH, mode=Mode.PRIVATE) - part_1.part
    nervure4 = nervure4_tool1.solids().sort_by_distance((2.8, 9.999582371, 17.640000004))[0]
    add(nervure4)

    # Congé1
    cong_1_edges = [part_1.edges().sort_by_distance(p)[0] for p in [
        (54.163207106, 0, 27.64),
        (63.63, 14.955, -27.64),
        (54.163207106, 0, -27.64),
        (63.63, 14.955, 27.64),
        (63.63, 0, 21.296081799),
        (63.63, 0, -21.296081799),
    ]]
    fillet(cong_1_edges, radius=CONG_1_R)

    # Symétrie3: Nervure4 across plane
    add(nervure4.mirror(Plane.XY))

    # Congé2
    cong_2_edges = [part_1.edges().sort_by_distance(p)[0] for p in [
        (63.63, 34.91, 24.64),
        (63.337106781, 34.91, 27.347106781),
        (63.63, 34.91, -24.64),
        (63.337106781, 34.91, -27.347106781),
        (0.8, 34.91, -25.14),
        (57.4225, 34.91, -27.64),
        (6.5075, 34.91, -27.64),
        (52.215, 5, 25.14),
        (12.215, 5, -25.14),
        (57.4225, 34.91, 27.64),
        (12.215, 5, 25.14),
        (52.215, 5, -25.14),
    ]]
    fillet(cong_2_edges, radius=CONG_2_R)


with BuildPart() as body_2_2:
    # Esquisse48 → Boss.-Extru.14 (new, two sides: drawn at the far end of the back side and taken through both)
    with BuildSketch(Plane.XY.offset(-BOSS_EXTRU_14_DEPTH_BACK)):
        with Locations((42.5, 20)):
            Circle(ESQUISSE48_R)
    extrude(amount=BOSS_EXTRU_14_DEPTH + BOSS_EXTRU_14_DEPTH_BACK)


solid = Compound([part_1.part, body_2_2.part])
